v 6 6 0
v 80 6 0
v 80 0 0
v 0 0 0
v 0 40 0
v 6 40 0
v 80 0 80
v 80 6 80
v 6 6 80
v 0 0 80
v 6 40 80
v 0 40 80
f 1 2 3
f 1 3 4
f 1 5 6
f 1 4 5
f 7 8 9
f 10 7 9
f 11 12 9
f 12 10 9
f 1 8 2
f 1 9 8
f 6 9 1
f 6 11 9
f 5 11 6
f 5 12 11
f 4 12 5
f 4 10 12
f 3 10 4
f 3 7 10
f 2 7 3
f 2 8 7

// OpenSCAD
$fn = 32;

// ----------------------------------------------------------------------
// Structural section: angle 80 x 40 mm
// ----------------------------------------------------------------------

// --- parameters (mm) ---
sec_w = 80;               // leg width, X
sec_h = 40;               // leg height, Y
flange_t = 6;             // leg thickness
plate_t = 80;             // cut length, Z (extrusion height)

profile = [[0, 0], [80, 0], [80, 6], [6, 6], [6, 40], [0, 40]];  // primary outline, 6 points, counter clockwise

// --- the one profile operation ---
linear_extrude(height = plate_t) polygon(points = profile);
